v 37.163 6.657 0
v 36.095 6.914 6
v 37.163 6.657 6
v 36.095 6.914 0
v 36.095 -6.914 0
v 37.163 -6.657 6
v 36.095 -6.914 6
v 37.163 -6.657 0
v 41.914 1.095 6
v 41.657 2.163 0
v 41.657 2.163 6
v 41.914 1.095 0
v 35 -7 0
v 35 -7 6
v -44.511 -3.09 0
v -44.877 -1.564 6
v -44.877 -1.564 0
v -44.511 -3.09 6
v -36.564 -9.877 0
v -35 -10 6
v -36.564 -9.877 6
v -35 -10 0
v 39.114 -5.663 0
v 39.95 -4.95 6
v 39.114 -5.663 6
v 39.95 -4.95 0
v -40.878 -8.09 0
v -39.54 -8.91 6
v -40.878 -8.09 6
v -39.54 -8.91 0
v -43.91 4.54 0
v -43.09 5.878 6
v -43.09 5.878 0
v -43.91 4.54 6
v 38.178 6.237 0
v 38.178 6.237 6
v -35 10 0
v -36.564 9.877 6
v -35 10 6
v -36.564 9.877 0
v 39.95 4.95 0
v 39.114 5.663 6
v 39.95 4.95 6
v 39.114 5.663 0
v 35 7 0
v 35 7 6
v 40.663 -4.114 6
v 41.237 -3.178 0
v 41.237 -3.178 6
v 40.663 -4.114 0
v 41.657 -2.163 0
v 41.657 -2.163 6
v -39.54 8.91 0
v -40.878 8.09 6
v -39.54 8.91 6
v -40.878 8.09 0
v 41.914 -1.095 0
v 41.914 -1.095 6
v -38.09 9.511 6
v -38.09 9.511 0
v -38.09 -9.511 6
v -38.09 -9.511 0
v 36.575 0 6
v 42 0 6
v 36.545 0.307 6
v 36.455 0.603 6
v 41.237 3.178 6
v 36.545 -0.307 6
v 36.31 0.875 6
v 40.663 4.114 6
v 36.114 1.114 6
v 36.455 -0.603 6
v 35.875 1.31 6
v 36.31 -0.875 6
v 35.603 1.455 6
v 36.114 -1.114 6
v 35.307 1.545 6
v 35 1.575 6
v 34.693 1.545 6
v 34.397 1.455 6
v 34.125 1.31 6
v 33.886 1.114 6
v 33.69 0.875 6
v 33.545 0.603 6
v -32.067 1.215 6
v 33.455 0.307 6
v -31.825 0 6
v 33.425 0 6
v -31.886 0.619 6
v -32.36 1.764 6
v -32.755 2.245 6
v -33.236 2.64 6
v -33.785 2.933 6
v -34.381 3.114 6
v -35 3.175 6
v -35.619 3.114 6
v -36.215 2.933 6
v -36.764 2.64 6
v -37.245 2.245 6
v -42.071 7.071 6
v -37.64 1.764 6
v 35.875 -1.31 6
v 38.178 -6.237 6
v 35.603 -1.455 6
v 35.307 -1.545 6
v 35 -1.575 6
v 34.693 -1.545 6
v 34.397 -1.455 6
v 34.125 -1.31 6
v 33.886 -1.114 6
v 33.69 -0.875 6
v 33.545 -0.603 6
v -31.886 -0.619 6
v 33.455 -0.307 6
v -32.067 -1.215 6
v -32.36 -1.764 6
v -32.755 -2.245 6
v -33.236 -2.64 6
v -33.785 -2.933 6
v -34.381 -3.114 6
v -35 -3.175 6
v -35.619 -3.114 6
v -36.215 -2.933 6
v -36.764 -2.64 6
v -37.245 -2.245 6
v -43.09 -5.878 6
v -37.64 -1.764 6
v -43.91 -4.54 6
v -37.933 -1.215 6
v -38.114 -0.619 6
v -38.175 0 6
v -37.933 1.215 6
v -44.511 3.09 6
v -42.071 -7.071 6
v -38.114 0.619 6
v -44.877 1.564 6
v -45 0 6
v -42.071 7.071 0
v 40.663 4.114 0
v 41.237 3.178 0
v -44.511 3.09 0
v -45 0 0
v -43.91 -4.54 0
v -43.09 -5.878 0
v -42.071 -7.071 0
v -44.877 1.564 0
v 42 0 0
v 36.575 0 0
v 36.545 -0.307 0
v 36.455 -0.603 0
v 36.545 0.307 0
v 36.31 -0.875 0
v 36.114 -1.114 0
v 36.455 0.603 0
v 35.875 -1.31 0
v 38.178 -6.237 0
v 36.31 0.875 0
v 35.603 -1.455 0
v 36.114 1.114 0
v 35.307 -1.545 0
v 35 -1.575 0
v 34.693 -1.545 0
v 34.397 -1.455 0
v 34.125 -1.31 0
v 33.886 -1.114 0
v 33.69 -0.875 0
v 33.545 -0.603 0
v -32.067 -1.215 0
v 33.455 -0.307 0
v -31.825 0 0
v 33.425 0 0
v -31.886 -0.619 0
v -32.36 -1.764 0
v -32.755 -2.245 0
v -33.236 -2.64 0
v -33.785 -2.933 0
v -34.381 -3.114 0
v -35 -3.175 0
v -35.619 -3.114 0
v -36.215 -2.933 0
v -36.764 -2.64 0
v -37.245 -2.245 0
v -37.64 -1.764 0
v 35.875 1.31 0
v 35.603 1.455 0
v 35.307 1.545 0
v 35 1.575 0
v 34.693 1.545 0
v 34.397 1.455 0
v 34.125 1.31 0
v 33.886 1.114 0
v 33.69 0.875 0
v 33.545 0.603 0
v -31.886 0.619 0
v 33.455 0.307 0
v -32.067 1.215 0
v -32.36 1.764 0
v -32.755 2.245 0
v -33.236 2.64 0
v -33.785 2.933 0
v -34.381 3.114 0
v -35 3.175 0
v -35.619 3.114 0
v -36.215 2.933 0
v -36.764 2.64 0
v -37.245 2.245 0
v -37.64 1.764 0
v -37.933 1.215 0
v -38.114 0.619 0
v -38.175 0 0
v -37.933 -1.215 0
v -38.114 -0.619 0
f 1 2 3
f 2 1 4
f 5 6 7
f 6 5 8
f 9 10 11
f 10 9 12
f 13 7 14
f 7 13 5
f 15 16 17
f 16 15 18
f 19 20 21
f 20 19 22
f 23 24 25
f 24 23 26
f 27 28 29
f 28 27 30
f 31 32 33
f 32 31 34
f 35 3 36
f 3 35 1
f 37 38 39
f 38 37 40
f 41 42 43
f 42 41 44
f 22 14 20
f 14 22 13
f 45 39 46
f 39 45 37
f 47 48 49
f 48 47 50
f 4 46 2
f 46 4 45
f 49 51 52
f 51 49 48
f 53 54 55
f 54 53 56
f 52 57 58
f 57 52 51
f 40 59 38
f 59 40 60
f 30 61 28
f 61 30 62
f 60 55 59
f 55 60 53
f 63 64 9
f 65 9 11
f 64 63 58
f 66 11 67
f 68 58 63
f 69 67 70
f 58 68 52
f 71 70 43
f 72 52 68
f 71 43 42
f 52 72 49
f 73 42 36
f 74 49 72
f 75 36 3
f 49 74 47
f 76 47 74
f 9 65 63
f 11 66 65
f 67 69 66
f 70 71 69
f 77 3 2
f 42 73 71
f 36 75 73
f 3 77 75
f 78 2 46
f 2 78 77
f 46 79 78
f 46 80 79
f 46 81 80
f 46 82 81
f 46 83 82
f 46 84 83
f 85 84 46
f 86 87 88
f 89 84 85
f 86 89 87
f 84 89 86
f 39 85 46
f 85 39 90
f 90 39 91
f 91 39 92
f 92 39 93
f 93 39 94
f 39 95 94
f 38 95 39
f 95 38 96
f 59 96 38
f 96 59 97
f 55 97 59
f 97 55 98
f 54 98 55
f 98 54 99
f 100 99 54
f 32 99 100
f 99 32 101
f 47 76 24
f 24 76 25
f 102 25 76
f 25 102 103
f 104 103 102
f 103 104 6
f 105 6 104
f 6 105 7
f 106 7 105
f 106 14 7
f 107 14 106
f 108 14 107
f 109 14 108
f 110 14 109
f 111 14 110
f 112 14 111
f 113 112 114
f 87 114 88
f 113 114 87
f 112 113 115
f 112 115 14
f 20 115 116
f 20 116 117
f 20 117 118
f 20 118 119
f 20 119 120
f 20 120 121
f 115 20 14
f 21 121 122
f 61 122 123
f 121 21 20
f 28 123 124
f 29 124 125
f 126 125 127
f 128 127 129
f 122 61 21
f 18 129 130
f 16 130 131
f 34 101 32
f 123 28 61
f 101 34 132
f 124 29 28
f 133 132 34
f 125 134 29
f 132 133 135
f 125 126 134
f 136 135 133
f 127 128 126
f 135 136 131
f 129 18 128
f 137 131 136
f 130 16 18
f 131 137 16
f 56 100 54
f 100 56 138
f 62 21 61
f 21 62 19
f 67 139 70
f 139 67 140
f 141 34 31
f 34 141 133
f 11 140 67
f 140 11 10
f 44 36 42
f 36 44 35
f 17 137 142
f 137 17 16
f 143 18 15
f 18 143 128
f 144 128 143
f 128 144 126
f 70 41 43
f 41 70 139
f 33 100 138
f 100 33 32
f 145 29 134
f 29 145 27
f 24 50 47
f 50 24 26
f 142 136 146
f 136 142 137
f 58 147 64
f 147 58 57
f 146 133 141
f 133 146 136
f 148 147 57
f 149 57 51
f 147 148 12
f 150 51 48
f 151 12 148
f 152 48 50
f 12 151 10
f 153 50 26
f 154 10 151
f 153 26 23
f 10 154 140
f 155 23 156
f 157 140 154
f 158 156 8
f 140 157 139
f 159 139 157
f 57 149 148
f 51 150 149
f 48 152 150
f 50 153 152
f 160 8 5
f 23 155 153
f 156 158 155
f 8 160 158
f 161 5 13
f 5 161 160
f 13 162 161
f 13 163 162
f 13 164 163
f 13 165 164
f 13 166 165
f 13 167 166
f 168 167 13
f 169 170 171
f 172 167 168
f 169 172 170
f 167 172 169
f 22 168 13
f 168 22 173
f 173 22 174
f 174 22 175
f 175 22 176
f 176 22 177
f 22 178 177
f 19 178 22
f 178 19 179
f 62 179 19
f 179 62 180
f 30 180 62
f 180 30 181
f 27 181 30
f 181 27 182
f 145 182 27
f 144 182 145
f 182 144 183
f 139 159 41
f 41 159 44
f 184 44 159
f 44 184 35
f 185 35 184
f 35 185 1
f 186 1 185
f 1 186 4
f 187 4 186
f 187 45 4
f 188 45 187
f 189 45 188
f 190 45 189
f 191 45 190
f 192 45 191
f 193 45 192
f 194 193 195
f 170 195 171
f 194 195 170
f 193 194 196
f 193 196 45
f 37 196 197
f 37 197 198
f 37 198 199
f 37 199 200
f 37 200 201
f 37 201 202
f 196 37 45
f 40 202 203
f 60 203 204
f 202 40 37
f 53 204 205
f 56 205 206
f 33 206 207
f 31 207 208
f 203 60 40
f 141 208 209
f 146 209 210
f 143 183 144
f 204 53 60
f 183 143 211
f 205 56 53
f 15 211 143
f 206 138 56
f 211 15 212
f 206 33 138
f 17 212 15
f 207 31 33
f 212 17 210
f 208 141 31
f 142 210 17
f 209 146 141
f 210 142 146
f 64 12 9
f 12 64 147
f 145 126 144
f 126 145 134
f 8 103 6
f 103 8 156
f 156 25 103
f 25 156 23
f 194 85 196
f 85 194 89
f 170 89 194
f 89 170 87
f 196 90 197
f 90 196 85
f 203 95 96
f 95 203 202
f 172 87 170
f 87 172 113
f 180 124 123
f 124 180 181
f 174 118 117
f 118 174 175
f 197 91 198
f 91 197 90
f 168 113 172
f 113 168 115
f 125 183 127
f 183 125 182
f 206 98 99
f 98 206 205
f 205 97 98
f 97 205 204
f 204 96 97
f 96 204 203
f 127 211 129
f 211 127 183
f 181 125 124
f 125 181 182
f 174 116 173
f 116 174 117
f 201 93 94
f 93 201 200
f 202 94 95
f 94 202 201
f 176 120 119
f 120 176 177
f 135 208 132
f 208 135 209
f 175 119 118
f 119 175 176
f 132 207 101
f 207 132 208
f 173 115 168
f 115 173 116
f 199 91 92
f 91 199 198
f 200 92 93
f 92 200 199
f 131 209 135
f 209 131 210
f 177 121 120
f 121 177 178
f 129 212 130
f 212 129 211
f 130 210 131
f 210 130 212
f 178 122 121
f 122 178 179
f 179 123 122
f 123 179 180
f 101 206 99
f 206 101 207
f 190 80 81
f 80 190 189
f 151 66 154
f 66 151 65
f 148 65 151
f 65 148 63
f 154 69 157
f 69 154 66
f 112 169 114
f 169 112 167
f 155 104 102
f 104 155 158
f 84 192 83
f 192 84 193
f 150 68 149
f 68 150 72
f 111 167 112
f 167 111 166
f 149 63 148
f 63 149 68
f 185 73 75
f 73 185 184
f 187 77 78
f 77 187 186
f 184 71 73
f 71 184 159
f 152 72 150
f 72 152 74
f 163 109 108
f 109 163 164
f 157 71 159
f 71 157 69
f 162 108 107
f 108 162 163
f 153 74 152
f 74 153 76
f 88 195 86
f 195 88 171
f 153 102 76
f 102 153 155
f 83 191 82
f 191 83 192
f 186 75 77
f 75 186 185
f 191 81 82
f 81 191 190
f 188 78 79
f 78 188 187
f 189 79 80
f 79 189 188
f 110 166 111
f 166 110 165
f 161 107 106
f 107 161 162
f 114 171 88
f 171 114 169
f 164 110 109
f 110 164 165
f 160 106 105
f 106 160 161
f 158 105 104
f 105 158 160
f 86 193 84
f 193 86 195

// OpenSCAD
$fn = 32;

// ----------------------------------------------------------------------
// Lever: 70 mm between the bosses, 6 mm thick, smooth outline
// ----------------------------------------------------------------------

// --- parameters (mm) ---
lever_l = 70;             // distance between the boss centres
boss_a = 20;              // first boss diameter
boss_b = 14;              // second boss diameter
bore_a = 6.35;            // first bore
bore_b = 3.15;            // second bore
lever_t = 6;              // lever thickness

lever_profile = [[-45, 0], [-44.877, -1.564], [-44.511, -3.09], [-43.91, -4.54], [-43.09, -5.878], [-42.071, -7.071], [-40.878, -8.09], [-39.54, -8.91], [-38.09, -9.511], [-36.564, -9.877], [-35, -10], [35, -7], [36.095, -6.914], [37.163, -6.657], [38.178, -6.237], [39.114, -5.663], [39.95, -4.95], [40.663, -4.114], [41.237, -3.178], [41.657, -2.163], [41.914, -1.095], [42, 0], [41.914, 1.095], [41.657, 2.163], [41.237, 3.178], [40.663, 4.114], [39.95, 4.95], [39.114, 5.663], [38.178, 6.237], [37.163, 6.657], [36.095, 6.914], [35, 7], [-35, 10], [-36.564, 9.877], [-38.09, 9.511], [-39.54, 8.91], [-40.878, 8.09], [-42.071, 7.071], [-43.09, 5.878], [-43.91, 4.54], [-44.511, 3.09], [-44.877, 1.564]];

difference() {
  linear_extrude(height = lever_t) polygon(lever_profile);
  translate([-35, 0, -2.5]) cylinder(h = lever_t + 5, d = bore_a);
  translate([35, 0, -2.5]) cylinder(h = lever_t + 5, d = bore_b);
}
